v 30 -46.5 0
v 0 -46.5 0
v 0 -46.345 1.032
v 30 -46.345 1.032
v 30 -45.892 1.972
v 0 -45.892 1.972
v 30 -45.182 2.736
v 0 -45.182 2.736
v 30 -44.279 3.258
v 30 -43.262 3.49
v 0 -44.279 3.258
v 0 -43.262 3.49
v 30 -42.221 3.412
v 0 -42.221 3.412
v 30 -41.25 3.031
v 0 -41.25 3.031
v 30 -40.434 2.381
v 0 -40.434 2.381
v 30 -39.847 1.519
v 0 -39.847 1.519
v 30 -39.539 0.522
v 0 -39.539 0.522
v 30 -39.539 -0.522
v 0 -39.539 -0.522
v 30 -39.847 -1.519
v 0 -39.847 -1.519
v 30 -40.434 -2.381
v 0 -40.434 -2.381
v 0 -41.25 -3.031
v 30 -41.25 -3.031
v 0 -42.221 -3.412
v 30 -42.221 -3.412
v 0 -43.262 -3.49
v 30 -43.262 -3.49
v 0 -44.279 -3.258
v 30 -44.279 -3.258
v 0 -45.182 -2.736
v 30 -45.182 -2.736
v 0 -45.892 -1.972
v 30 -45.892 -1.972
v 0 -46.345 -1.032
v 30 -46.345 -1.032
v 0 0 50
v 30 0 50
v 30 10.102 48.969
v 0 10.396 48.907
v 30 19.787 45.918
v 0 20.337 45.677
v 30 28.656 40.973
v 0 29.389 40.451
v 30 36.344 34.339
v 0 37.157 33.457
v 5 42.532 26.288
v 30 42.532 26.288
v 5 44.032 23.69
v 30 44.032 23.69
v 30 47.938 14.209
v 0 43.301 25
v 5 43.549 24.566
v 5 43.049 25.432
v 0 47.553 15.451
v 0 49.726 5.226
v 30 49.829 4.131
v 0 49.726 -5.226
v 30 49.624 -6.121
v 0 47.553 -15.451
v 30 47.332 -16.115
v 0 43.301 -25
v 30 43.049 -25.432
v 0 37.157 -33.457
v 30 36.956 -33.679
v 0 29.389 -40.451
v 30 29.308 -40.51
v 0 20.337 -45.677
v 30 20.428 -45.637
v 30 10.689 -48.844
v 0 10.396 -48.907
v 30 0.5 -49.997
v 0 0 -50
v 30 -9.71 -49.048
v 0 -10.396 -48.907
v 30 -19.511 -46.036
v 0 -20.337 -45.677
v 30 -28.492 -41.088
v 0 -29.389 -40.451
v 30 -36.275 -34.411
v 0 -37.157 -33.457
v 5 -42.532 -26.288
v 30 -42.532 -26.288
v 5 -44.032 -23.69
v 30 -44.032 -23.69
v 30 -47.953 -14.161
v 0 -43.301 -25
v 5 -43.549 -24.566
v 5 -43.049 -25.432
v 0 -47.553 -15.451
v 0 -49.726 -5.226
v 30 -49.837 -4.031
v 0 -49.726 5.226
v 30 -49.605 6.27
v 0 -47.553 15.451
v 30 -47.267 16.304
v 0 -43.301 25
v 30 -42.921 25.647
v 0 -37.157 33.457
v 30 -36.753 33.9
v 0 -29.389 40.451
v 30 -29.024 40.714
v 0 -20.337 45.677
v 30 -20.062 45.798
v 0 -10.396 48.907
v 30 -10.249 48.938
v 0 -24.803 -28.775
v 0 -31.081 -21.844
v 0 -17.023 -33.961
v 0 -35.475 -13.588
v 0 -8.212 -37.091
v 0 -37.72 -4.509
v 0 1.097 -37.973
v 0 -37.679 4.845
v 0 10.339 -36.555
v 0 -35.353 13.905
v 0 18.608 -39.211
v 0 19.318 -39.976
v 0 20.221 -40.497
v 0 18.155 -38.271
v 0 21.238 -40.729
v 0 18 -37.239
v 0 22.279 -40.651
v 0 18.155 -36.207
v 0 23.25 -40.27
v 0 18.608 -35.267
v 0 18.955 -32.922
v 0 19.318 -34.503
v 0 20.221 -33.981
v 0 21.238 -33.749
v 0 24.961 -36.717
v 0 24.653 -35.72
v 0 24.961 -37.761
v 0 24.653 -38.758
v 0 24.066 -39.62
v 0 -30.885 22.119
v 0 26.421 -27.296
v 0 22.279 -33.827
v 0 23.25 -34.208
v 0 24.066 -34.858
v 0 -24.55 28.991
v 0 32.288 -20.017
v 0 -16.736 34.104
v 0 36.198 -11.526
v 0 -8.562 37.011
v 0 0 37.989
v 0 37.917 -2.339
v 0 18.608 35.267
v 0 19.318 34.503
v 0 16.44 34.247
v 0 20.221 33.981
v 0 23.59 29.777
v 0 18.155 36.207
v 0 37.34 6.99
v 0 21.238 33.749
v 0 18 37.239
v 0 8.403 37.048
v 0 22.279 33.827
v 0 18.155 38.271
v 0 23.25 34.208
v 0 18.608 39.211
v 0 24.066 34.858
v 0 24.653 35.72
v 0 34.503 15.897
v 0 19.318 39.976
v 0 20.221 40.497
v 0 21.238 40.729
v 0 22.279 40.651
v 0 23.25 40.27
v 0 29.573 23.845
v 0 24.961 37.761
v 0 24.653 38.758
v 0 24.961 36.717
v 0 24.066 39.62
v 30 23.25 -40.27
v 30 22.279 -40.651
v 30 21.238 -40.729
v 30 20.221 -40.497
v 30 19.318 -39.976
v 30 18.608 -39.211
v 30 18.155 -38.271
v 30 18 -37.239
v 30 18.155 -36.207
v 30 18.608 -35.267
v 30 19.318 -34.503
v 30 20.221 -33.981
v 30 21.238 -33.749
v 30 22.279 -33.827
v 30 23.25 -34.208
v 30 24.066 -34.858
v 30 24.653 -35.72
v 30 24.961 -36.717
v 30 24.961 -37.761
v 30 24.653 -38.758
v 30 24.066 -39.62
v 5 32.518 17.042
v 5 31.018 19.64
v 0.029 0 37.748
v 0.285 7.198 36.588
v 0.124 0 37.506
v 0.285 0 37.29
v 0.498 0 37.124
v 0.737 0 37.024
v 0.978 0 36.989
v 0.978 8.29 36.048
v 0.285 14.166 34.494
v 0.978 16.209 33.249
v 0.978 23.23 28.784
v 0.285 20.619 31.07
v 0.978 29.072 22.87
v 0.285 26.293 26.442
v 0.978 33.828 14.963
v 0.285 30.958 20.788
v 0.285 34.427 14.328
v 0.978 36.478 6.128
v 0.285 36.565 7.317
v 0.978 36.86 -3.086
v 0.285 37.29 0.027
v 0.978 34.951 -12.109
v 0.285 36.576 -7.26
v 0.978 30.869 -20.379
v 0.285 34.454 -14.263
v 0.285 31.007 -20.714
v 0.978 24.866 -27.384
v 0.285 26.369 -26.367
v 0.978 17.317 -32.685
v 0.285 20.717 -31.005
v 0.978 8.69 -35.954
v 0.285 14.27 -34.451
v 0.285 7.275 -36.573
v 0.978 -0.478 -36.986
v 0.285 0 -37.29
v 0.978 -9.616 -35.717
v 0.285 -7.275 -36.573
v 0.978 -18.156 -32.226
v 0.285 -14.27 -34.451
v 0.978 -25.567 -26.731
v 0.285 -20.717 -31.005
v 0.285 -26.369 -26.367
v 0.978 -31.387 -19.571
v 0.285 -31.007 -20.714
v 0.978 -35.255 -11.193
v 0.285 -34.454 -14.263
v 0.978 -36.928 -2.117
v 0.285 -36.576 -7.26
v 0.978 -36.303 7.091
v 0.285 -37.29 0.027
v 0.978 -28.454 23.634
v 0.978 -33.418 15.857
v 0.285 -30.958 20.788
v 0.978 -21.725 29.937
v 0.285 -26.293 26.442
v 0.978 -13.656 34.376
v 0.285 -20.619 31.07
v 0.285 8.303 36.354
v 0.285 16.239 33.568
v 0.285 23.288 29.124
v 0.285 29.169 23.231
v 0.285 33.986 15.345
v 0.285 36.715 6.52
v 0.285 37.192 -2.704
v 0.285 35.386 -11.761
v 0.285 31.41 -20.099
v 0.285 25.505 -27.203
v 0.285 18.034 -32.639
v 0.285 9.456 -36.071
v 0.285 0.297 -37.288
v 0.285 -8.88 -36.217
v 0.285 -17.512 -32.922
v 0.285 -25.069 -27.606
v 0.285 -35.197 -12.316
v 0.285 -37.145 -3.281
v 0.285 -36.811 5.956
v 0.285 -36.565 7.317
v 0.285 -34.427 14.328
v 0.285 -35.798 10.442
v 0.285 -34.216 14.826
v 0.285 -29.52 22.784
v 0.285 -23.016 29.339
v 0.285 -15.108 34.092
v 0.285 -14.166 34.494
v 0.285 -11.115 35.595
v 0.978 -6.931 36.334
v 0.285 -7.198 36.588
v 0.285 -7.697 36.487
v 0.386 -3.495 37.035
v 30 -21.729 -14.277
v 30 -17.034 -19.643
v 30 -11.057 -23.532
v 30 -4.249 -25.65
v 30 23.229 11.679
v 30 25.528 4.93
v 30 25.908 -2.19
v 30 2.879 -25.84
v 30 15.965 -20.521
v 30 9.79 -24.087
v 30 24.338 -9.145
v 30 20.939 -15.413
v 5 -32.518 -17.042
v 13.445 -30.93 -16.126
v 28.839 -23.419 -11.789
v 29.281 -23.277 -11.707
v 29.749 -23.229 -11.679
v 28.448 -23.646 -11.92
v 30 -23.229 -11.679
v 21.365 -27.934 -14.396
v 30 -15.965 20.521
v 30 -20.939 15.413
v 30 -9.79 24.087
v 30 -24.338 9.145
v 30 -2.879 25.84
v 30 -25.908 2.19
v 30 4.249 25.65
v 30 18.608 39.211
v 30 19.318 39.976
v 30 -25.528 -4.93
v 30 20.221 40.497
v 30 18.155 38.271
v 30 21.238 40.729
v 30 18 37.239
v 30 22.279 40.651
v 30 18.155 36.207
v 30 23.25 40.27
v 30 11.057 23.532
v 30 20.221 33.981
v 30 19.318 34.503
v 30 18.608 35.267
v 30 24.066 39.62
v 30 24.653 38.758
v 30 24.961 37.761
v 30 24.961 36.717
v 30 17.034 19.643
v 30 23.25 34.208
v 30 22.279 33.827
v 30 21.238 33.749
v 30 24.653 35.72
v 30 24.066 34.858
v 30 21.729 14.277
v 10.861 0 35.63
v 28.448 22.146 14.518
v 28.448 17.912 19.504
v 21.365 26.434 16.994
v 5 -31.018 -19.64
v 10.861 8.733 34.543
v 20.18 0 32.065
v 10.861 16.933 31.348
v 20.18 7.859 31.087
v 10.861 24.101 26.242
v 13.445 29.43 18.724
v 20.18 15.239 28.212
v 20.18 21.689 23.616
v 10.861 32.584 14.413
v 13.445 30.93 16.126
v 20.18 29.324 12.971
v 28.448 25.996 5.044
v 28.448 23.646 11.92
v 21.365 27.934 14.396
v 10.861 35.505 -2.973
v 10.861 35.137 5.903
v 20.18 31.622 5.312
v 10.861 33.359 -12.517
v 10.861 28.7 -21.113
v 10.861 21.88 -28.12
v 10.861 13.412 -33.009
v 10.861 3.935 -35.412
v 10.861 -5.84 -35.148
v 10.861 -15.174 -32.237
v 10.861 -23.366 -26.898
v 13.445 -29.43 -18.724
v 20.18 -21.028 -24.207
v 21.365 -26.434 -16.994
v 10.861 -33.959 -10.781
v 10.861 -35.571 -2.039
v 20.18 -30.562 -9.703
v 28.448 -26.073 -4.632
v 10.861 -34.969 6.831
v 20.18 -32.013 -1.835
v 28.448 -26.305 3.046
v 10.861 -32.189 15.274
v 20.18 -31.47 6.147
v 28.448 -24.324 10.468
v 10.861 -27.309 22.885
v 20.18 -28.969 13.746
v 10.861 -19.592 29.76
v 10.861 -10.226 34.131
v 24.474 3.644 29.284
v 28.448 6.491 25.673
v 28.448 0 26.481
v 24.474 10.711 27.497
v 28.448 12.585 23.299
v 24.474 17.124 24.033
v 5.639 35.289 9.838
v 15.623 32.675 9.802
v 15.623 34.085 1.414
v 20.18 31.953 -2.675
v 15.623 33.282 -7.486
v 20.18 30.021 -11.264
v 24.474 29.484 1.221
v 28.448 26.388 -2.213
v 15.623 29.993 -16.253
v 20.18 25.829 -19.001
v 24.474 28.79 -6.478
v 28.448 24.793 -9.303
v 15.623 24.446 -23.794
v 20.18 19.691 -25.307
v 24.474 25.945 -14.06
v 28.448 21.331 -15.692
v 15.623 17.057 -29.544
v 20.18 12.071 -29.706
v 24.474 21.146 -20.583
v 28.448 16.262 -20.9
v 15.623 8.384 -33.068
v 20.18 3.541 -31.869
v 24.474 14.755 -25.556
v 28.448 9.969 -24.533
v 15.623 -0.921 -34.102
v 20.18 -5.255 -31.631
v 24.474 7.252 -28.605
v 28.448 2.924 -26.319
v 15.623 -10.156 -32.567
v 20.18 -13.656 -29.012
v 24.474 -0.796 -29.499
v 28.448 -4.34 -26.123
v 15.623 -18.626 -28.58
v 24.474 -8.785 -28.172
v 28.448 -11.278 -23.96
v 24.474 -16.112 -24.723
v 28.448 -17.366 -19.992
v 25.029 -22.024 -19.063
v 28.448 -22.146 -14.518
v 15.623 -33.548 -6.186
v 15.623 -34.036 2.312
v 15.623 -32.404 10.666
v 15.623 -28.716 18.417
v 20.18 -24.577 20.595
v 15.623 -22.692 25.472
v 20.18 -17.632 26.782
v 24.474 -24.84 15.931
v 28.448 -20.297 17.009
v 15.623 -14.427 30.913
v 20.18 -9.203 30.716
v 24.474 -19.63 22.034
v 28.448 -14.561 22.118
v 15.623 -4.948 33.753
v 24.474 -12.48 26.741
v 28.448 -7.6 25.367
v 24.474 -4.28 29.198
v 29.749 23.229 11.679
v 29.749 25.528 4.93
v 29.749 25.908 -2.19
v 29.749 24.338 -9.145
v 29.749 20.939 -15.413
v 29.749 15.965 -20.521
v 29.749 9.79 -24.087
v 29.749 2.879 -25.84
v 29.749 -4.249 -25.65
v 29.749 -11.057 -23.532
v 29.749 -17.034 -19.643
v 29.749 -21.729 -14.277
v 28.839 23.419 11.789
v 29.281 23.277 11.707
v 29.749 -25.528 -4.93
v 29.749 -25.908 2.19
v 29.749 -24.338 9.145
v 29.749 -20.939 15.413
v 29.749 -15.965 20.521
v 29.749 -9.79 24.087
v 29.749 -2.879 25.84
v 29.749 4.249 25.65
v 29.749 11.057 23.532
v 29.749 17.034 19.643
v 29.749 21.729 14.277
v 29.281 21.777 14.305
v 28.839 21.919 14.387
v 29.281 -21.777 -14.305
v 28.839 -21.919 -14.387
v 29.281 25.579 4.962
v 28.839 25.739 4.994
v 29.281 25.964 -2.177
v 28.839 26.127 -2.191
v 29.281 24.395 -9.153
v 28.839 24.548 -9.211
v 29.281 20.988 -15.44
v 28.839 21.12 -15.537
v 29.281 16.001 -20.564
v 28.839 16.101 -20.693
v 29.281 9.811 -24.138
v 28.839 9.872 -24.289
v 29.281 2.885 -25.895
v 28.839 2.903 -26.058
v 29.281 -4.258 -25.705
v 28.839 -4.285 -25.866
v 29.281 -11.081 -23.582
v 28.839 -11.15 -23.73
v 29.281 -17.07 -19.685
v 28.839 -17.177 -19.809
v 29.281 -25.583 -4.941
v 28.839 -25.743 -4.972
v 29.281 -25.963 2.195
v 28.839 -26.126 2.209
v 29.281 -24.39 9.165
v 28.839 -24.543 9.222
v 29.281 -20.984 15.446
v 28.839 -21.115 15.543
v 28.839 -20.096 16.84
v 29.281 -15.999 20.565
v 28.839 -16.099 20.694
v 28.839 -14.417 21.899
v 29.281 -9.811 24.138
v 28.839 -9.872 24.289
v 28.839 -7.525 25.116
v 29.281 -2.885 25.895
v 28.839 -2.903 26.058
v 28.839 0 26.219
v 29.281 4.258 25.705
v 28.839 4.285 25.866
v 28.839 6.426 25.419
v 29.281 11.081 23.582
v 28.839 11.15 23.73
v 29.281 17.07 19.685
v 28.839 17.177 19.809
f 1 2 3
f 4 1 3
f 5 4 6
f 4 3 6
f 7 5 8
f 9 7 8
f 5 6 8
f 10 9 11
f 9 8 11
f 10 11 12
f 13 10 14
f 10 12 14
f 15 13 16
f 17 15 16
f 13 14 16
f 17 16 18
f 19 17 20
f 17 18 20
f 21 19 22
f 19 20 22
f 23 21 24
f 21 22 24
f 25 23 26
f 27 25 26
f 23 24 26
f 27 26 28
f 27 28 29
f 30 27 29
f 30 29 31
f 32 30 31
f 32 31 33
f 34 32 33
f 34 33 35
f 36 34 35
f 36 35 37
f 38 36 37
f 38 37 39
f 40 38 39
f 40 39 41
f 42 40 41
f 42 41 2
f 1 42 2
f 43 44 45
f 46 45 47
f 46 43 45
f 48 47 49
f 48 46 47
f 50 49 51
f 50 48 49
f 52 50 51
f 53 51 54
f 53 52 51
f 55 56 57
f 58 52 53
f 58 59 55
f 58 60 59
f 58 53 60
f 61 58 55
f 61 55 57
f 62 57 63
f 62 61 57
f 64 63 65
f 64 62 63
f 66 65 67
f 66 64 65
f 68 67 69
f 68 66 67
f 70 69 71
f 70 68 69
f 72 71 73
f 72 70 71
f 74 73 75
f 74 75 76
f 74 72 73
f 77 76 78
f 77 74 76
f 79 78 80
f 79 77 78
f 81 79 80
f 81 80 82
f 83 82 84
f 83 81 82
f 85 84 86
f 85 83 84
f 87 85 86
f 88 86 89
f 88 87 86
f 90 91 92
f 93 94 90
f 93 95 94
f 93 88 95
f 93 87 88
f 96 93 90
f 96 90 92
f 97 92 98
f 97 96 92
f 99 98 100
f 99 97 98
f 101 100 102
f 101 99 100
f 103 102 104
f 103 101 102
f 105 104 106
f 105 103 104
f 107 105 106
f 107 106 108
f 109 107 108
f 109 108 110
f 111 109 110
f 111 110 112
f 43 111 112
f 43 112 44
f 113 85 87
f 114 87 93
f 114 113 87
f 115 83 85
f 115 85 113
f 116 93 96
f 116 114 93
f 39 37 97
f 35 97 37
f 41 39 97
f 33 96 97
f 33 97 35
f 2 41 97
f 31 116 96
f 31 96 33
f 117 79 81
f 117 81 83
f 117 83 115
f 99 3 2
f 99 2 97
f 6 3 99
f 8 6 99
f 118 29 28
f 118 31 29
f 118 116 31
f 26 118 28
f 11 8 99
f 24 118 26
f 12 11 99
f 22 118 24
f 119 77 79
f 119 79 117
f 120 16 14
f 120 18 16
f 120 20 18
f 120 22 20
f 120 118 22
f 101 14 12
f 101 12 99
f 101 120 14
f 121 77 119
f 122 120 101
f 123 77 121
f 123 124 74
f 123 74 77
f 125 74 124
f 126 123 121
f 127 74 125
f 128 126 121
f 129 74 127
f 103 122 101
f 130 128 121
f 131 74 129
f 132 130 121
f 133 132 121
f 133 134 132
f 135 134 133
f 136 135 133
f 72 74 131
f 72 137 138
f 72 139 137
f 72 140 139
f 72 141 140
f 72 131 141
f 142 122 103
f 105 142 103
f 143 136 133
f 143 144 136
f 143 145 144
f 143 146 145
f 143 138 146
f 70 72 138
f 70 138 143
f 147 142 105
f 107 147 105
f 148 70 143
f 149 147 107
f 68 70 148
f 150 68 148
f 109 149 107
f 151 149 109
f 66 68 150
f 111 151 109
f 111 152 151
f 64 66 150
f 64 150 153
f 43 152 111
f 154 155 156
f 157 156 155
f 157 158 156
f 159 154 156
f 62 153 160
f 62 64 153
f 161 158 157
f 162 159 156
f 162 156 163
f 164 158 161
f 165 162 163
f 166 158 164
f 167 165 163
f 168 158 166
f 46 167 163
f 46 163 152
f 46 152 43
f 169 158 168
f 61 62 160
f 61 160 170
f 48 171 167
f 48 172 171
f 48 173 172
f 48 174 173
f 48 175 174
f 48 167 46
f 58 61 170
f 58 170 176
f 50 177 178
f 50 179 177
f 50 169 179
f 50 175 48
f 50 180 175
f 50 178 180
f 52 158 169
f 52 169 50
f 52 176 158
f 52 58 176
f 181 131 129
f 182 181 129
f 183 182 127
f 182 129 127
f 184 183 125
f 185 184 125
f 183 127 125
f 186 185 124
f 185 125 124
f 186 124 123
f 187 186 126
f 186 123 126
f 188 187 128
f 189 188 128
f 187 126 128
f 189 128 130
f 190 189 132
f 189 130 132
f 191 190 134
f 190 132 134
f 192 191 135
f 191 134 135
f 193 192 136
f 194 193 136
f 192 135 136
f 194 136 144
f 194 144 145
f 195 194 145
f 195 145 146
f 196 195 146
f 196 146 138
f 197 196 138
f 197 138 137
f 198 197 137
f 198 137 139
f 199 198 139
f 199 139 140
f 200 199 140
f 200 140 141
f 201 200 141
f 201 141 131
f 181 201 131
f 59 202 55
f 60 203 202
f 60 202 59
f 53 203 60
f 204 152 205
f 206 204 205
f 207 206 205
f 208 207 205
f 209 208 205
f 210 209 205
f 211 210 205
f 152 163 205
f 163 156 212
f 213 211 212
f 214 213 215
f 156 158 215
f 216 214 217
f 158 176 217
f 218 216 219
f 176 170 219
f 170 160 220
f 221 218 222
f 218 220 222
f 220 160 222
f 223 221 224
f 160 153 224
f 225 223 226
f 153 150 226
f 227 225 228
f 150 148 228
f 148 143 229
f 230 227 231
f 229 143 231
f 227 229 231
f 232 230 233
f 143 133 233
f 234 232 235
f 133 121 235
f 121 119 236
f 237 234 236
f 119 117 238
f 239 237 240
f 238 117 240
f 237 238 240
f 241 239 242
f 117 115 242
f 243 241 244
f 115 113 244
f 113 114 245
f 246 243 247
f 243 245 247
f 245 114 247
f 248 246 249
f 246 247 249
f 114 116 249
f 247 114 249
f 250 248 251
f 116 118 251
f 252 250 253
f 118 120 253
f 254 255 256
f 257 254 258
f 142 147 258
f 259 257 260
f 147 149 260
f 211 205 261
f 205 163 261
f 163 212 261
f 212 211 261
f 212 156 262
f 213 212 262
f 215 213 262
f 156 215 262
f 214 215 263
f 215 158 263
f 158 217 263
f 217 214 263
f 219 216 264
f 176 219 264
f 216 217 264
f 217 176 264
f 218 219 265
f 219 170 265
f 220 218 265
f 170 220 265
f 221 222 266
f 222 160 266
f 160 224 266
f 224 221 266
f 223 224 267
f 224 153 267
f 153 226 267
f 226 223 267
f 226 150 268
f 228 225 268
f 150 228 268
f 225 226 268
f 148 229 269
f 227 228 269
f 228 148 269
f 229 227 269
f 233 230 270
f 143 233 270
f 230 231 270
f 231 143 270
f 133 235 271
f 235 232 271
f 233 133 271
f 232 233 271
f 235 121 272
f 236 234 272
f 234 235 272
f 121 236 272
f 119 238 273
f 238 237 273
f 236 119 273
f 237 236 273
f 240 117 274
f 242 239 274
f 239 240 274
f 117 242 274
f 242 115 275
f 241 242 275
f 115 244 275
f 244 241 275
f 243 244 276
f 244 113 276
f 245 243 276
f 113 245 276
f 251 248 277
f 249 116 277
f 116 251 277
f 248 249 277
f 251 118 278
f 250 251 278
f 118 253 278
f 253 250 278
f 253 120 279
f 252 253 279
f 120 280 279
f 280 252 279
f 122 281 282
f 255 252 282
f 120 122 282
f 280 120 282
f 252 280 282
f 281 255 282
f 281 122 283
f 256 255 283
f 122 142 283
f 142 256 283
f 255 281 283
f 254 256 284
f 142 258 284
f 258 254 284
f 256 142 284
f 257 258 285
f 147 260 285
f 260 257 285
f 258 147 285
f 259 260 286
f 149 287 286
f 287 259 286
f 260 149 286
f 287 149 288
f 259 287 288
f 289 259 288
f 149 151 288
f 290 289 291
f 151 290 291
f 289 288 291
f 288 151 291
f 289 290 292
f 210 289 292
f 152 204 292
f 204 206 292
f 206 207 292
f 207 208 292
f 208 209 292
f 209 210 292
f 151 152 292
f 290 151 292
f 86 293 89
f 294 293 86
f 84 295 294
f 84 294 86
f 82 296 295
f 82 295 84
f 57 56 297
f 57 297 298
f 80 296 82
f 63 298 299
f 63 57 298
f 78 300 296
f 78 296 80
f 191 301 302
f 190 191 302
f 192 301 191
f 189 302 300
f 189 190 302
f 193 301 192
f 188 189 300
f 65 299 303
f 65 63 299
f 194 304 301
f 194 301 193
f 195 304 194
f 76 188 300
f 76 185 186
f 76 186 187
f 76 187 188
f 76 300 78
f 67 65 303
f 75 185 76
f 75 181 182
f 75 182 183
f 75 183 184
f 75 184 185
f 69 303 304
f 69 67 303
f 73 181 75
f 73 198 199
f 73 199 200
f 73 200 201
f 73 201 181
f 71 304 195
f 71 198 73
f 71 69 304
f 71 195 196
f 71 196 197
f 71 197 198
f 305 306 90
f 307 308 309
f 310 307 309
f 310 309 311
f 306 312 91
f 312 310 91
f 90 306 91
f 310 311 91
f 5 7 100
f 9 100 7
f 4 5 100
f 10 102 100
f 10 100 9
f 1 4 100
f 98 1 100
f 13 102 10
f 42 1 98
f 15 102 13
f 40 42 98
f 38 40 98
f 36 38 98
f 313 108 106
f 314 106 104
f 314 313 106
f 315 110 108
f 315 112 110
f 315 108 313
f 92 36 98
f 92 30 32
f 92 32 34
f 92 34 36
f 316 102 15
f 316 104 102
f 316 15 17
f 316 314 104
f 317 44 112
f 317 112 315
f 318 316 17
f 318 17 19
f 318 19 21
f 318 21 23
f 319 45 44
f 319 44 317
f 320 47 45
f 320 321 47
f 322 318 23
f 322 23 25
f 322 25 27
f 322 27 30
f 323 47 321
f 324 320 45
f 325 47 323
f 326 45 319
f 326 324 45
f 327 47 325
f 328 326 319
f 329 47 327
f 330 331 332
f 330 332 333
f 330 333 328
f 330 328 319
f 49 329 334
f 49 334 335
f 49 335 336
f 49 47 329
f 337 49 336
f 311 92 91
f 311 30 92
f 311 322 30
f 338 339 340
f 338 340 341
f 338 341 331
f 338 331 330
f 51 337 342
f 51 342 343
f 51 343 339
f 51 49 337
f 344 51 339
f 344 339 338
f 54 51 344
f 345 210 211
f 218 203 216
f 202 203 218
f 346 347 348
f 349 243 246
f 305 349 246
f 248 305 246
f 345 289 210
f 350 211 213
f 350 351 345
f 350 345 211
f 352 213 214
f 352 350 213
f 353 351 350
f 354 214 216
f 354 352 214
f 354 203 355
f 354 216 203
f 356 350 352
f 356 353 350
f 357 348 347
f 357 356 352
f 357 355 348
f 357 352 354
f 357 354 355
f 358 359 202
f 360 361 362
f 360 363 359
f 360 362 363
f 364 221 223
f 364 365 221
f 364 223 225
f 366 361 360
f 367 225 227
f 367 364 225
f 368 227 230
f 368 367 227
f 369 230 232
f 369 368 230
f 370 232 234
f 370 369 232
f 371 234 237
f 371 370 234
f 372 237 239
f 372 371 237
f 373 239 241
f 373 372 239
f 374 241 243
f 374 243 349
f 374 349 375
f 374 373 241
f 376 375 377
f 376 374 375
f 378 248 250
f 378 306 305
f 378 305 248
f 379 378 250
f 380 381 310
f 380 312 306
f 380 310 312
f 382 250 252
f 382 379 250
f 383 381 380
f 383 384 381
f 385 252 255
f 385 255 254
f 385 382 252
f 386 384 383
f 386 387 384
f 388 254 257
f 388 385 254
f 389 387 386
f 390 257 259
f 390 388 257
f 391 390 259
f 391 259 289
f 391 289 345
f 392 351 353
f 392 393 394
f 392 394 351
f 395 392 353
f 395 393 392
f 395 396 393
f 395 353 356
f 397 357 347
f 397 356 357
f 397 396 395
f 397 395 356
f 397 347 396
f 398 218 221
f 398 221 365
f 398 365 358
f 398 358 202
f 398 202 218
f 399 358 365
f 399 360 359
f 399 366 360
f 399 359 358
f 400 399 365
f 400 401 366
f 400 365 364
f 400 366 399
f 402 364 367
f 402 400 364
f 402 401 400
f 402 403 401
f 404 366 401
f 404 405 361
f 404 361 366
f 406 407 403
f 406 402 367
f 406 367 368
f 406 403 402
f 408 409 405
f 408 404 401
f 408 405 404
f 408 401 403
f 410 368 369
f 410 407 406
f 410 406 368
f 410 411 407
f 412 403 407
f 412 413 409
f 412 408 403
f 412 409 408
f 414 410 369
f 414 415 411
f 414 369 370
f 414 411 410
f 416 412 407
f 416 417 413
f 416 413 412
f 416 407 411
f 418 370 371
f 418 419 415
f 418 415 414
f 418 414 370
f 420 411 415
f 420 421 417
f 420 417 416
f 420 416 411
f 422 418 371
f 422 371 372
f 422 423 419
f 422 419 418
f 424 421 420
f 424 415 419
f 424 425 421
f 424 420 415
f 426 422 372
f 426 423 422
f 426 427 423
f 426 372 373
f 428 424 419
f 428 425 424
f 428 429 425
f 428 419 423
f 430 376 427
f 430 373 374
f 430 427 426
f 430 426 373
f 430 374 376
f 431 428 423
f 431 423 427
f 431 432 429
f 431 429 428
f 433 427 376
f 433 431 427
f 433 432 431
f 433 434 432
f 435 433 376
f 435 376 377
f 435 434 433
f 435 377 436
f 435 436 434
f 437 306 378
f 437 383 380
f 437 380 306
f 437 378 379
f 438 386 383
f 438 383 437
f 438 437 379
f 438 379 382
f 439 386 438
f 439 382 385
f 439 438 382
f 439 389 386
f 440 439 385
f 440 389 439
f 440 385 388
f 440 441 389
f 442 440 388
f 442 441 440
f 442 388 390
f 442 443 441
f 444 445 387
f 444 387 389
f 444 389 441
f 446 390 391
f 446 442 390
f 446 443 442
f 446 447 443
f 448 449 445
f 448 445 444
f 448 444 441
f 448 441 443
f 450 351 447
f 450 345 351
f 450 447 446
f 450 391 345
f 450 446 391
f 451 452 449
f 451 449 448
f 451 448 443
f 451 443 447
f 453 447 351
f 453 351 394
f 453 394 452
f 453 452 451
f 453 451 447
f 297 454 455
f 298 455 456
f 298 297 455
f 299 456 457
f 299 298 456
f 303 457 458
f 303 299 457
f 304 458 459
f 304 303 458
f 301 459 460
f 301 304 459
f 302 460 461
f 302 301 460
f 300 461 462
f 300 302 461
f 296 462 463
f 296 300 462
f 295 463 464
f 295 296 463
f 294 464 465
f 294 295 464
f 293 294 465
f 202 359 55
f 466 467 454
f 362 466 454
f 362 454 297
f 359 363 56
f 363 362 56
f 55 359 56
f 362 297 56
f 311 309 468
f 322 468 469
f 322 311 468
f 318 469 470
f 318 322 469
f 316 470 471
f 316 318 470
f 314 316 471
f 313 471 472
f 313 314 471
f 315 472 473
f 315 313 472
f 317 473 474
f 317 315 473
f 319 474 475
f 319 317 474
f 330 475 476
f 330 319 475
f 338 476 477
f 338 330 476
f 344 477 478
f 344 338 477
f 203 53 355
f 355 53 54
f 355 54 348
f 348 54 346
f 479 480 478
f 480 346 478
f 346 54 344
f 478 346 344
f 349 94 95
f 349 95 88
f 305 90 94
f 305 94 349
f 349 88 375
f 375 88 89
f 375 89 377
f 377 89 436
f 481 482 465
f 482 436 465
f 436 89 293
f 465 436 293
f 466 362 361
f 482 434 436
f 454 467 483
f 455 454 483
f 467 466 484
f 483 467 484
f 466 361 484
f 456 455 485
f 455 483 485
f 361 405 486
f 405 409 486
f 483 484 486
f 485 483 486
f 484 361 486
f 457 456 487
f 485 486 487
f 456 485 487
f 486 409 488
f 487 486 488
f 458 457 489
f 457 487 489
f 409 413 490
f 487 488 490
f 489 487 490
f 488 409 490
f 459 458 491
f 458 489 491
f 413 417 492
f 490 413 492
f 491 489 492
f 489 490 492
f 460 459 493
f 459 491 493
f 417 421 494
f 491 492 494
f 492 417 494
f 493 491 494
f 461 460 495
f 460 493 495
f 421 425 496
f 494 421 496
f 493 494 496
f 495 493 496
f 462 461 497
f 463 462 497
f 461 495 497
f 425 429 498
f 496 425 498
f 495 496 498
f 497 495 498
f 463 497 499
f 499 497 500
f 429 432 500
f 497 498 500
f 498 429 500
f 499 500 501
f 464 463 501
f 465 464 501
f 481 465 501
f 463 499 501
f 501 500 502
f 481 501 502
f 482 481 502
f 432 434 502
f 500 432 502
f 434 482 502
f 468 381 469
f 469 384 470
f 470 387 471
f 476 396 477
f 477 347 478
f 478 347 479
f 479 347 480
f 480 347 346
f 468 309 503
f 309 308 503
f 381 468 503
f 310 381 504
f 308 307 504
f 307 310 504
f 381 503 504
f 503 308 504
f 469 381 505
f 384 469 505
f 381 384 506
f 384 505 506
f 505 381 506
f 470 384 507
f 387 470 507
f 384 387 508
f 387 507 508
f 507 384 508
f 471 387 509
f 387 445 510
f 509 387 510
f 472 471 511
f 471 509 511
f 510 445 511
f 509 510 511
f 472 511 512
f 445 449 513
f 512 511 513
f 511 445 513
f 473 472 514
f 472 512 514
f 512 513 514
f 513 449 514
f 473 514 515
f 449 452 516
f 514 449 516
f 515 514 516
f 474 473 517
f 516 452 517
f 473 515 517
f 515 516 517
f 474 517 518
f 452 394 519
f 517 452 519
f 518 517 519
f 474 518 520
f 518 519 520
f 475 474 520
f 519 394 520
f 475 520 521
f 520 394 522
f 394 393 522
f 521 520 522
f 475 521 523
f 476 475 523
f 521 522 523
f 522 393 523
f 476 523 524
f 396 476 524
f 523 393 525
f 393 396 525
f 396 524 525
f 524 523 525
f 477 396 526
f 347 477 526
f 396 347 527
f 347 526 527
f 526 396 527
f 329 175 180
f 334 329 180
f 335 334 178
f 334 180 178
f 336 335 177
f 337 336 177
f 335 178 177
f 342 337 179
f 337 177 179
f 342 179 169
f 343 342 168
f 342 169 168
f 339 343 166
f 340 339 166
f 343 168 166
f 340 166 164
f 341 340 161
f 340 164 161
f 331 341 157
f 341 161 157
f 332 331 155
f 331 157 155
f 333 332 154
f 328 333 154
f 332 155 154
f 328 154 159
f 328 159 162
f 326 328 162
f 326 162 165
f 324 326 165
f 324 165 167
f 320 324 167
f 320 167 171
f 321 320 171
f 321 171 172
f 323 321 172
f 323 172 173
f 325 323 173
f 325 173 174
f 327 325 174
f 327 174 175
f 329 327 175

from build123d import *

# Parameters (mm, degrees)
F3_R            = 1
F4_R            = 3.5
F5_DEPTH        = 30.001
F5_COPIES_COUNT = 3
F7_DEPTH        = 25


# Not quite as in the source:
# - a fillet or chamfer that OpenCascade refuses, or shapes differently, is made with other operations: its cross-section is extruded or revolved along the edge and cut away or added
# - a pattern or mirror of a feature is missing from the dataset's text; its kind, count and spacing are read off the source's solid


with BuildPart() as f1:
    # F0 (on Front) → F1 (revolve)
    with BuildSketch(Plane.XZ):
        with BuildLine():
            Line((30, 50), (0, 50))
            Line((0, 50), (0, 37))
            ThreePointArc((0, 37), (15.5080624193, 34.1576191054), (29, 26))
            Line((29, 26), (30, 26))
            Line((30, 26), (30, 50))
        make_face()
    revolve(axis=Axis((-20.2939212322, 0, 0), (-1, 0, 0)))

    # F2: fillet of radius 2 on 1 edges, made by hand

    # F2_s1 → F2_t2 (revolve, cut)
    with BuildSketch(Plane.XZ):
        with BuildLine():
            ThreePointArc((29.7489495613, 26), (29.0553262341, 26.1241304203), (28.447802662, 26.4811133201))
            ThreePointArc((28.447802662, 26.4811133201), (28.7249086192, 26.241712774), (29, 26))
            Line((29, 26), (29.7489495613, 26))
        make_face()
    revolve(axis=Axis((29, 0, 0), (-1, 0, 0)), mode=Mode.SUBTRACT)

    # F3
    f3_edges = [f1.edges().sort_by_distance(p)[0] for p in [
        (0, 0, -37),
    ]]
    fillet(f3_edges, radius=F3_R)

    # F4 (on face) → F5 (cut, through all)
    with BuildSketch(Plane(origin=(0, 0, 0), x_dir=(0, -1, 0), z_dir=(-1, 0, 0))):
        with Locations((43, 0)):
            Circle(F4_R)
    f5 = extrude(amount=-F5_DEPTH, mode=Mode.SUBTRACT)

    # F5_copies: F5 ×3 about axis
    f5_copies_axis = Axis((0, 0, 0), (1, 0, 0))
    for i in range(1, F5_COPIES_COUNT):
        add(f5.rotate(f5_copies_axis, i * 360 / F5_COPIES_COUNT), mode=Mode.SUBTRACT)

    # F6 (on face) → F7 (cut)
    with BuildSketch(Plane.YZ.offset(30)):
        with BuildLine():
            ThreePointArc((44.0317802314, 23.6897093619), (43.3012701892, 25), (42.5317802314, 26.2877855733))
            Line((42.5317802314, 26.2877855733), (21.7291570127, 14.2773854581))
            ThreePointArc((21.7291570127, 14.2773854581), (22.5166604984, 13), (23.2291570127, 11.6793092467))
            Line((23.2291570127, 11.6793092467), (44.0317802314, 23.6897093619))
        make_face()
        with BuildLine():
            Line((-23.2291570127, -11.6793092467), (-44.0317802314, -23.6897093619))
            ThreePointArc((-44.0317802314, -23.6897093619), (-43.3012701892, -25), (-42.5317802314, -26.2877855733))
            Line((-42.5317802314, -26.2877855733), (-21.7291570127, -14.2773854581))
            ThreePointArc((-21.7291570127, -14.2773854581), (-22.5166604984, -13), (-23.2291570127, -11.6793092467))
        make_face()
    extrude(amount=-F7_DEPTH, mode=Mode.SUBTRACT)


solid = f1.part
